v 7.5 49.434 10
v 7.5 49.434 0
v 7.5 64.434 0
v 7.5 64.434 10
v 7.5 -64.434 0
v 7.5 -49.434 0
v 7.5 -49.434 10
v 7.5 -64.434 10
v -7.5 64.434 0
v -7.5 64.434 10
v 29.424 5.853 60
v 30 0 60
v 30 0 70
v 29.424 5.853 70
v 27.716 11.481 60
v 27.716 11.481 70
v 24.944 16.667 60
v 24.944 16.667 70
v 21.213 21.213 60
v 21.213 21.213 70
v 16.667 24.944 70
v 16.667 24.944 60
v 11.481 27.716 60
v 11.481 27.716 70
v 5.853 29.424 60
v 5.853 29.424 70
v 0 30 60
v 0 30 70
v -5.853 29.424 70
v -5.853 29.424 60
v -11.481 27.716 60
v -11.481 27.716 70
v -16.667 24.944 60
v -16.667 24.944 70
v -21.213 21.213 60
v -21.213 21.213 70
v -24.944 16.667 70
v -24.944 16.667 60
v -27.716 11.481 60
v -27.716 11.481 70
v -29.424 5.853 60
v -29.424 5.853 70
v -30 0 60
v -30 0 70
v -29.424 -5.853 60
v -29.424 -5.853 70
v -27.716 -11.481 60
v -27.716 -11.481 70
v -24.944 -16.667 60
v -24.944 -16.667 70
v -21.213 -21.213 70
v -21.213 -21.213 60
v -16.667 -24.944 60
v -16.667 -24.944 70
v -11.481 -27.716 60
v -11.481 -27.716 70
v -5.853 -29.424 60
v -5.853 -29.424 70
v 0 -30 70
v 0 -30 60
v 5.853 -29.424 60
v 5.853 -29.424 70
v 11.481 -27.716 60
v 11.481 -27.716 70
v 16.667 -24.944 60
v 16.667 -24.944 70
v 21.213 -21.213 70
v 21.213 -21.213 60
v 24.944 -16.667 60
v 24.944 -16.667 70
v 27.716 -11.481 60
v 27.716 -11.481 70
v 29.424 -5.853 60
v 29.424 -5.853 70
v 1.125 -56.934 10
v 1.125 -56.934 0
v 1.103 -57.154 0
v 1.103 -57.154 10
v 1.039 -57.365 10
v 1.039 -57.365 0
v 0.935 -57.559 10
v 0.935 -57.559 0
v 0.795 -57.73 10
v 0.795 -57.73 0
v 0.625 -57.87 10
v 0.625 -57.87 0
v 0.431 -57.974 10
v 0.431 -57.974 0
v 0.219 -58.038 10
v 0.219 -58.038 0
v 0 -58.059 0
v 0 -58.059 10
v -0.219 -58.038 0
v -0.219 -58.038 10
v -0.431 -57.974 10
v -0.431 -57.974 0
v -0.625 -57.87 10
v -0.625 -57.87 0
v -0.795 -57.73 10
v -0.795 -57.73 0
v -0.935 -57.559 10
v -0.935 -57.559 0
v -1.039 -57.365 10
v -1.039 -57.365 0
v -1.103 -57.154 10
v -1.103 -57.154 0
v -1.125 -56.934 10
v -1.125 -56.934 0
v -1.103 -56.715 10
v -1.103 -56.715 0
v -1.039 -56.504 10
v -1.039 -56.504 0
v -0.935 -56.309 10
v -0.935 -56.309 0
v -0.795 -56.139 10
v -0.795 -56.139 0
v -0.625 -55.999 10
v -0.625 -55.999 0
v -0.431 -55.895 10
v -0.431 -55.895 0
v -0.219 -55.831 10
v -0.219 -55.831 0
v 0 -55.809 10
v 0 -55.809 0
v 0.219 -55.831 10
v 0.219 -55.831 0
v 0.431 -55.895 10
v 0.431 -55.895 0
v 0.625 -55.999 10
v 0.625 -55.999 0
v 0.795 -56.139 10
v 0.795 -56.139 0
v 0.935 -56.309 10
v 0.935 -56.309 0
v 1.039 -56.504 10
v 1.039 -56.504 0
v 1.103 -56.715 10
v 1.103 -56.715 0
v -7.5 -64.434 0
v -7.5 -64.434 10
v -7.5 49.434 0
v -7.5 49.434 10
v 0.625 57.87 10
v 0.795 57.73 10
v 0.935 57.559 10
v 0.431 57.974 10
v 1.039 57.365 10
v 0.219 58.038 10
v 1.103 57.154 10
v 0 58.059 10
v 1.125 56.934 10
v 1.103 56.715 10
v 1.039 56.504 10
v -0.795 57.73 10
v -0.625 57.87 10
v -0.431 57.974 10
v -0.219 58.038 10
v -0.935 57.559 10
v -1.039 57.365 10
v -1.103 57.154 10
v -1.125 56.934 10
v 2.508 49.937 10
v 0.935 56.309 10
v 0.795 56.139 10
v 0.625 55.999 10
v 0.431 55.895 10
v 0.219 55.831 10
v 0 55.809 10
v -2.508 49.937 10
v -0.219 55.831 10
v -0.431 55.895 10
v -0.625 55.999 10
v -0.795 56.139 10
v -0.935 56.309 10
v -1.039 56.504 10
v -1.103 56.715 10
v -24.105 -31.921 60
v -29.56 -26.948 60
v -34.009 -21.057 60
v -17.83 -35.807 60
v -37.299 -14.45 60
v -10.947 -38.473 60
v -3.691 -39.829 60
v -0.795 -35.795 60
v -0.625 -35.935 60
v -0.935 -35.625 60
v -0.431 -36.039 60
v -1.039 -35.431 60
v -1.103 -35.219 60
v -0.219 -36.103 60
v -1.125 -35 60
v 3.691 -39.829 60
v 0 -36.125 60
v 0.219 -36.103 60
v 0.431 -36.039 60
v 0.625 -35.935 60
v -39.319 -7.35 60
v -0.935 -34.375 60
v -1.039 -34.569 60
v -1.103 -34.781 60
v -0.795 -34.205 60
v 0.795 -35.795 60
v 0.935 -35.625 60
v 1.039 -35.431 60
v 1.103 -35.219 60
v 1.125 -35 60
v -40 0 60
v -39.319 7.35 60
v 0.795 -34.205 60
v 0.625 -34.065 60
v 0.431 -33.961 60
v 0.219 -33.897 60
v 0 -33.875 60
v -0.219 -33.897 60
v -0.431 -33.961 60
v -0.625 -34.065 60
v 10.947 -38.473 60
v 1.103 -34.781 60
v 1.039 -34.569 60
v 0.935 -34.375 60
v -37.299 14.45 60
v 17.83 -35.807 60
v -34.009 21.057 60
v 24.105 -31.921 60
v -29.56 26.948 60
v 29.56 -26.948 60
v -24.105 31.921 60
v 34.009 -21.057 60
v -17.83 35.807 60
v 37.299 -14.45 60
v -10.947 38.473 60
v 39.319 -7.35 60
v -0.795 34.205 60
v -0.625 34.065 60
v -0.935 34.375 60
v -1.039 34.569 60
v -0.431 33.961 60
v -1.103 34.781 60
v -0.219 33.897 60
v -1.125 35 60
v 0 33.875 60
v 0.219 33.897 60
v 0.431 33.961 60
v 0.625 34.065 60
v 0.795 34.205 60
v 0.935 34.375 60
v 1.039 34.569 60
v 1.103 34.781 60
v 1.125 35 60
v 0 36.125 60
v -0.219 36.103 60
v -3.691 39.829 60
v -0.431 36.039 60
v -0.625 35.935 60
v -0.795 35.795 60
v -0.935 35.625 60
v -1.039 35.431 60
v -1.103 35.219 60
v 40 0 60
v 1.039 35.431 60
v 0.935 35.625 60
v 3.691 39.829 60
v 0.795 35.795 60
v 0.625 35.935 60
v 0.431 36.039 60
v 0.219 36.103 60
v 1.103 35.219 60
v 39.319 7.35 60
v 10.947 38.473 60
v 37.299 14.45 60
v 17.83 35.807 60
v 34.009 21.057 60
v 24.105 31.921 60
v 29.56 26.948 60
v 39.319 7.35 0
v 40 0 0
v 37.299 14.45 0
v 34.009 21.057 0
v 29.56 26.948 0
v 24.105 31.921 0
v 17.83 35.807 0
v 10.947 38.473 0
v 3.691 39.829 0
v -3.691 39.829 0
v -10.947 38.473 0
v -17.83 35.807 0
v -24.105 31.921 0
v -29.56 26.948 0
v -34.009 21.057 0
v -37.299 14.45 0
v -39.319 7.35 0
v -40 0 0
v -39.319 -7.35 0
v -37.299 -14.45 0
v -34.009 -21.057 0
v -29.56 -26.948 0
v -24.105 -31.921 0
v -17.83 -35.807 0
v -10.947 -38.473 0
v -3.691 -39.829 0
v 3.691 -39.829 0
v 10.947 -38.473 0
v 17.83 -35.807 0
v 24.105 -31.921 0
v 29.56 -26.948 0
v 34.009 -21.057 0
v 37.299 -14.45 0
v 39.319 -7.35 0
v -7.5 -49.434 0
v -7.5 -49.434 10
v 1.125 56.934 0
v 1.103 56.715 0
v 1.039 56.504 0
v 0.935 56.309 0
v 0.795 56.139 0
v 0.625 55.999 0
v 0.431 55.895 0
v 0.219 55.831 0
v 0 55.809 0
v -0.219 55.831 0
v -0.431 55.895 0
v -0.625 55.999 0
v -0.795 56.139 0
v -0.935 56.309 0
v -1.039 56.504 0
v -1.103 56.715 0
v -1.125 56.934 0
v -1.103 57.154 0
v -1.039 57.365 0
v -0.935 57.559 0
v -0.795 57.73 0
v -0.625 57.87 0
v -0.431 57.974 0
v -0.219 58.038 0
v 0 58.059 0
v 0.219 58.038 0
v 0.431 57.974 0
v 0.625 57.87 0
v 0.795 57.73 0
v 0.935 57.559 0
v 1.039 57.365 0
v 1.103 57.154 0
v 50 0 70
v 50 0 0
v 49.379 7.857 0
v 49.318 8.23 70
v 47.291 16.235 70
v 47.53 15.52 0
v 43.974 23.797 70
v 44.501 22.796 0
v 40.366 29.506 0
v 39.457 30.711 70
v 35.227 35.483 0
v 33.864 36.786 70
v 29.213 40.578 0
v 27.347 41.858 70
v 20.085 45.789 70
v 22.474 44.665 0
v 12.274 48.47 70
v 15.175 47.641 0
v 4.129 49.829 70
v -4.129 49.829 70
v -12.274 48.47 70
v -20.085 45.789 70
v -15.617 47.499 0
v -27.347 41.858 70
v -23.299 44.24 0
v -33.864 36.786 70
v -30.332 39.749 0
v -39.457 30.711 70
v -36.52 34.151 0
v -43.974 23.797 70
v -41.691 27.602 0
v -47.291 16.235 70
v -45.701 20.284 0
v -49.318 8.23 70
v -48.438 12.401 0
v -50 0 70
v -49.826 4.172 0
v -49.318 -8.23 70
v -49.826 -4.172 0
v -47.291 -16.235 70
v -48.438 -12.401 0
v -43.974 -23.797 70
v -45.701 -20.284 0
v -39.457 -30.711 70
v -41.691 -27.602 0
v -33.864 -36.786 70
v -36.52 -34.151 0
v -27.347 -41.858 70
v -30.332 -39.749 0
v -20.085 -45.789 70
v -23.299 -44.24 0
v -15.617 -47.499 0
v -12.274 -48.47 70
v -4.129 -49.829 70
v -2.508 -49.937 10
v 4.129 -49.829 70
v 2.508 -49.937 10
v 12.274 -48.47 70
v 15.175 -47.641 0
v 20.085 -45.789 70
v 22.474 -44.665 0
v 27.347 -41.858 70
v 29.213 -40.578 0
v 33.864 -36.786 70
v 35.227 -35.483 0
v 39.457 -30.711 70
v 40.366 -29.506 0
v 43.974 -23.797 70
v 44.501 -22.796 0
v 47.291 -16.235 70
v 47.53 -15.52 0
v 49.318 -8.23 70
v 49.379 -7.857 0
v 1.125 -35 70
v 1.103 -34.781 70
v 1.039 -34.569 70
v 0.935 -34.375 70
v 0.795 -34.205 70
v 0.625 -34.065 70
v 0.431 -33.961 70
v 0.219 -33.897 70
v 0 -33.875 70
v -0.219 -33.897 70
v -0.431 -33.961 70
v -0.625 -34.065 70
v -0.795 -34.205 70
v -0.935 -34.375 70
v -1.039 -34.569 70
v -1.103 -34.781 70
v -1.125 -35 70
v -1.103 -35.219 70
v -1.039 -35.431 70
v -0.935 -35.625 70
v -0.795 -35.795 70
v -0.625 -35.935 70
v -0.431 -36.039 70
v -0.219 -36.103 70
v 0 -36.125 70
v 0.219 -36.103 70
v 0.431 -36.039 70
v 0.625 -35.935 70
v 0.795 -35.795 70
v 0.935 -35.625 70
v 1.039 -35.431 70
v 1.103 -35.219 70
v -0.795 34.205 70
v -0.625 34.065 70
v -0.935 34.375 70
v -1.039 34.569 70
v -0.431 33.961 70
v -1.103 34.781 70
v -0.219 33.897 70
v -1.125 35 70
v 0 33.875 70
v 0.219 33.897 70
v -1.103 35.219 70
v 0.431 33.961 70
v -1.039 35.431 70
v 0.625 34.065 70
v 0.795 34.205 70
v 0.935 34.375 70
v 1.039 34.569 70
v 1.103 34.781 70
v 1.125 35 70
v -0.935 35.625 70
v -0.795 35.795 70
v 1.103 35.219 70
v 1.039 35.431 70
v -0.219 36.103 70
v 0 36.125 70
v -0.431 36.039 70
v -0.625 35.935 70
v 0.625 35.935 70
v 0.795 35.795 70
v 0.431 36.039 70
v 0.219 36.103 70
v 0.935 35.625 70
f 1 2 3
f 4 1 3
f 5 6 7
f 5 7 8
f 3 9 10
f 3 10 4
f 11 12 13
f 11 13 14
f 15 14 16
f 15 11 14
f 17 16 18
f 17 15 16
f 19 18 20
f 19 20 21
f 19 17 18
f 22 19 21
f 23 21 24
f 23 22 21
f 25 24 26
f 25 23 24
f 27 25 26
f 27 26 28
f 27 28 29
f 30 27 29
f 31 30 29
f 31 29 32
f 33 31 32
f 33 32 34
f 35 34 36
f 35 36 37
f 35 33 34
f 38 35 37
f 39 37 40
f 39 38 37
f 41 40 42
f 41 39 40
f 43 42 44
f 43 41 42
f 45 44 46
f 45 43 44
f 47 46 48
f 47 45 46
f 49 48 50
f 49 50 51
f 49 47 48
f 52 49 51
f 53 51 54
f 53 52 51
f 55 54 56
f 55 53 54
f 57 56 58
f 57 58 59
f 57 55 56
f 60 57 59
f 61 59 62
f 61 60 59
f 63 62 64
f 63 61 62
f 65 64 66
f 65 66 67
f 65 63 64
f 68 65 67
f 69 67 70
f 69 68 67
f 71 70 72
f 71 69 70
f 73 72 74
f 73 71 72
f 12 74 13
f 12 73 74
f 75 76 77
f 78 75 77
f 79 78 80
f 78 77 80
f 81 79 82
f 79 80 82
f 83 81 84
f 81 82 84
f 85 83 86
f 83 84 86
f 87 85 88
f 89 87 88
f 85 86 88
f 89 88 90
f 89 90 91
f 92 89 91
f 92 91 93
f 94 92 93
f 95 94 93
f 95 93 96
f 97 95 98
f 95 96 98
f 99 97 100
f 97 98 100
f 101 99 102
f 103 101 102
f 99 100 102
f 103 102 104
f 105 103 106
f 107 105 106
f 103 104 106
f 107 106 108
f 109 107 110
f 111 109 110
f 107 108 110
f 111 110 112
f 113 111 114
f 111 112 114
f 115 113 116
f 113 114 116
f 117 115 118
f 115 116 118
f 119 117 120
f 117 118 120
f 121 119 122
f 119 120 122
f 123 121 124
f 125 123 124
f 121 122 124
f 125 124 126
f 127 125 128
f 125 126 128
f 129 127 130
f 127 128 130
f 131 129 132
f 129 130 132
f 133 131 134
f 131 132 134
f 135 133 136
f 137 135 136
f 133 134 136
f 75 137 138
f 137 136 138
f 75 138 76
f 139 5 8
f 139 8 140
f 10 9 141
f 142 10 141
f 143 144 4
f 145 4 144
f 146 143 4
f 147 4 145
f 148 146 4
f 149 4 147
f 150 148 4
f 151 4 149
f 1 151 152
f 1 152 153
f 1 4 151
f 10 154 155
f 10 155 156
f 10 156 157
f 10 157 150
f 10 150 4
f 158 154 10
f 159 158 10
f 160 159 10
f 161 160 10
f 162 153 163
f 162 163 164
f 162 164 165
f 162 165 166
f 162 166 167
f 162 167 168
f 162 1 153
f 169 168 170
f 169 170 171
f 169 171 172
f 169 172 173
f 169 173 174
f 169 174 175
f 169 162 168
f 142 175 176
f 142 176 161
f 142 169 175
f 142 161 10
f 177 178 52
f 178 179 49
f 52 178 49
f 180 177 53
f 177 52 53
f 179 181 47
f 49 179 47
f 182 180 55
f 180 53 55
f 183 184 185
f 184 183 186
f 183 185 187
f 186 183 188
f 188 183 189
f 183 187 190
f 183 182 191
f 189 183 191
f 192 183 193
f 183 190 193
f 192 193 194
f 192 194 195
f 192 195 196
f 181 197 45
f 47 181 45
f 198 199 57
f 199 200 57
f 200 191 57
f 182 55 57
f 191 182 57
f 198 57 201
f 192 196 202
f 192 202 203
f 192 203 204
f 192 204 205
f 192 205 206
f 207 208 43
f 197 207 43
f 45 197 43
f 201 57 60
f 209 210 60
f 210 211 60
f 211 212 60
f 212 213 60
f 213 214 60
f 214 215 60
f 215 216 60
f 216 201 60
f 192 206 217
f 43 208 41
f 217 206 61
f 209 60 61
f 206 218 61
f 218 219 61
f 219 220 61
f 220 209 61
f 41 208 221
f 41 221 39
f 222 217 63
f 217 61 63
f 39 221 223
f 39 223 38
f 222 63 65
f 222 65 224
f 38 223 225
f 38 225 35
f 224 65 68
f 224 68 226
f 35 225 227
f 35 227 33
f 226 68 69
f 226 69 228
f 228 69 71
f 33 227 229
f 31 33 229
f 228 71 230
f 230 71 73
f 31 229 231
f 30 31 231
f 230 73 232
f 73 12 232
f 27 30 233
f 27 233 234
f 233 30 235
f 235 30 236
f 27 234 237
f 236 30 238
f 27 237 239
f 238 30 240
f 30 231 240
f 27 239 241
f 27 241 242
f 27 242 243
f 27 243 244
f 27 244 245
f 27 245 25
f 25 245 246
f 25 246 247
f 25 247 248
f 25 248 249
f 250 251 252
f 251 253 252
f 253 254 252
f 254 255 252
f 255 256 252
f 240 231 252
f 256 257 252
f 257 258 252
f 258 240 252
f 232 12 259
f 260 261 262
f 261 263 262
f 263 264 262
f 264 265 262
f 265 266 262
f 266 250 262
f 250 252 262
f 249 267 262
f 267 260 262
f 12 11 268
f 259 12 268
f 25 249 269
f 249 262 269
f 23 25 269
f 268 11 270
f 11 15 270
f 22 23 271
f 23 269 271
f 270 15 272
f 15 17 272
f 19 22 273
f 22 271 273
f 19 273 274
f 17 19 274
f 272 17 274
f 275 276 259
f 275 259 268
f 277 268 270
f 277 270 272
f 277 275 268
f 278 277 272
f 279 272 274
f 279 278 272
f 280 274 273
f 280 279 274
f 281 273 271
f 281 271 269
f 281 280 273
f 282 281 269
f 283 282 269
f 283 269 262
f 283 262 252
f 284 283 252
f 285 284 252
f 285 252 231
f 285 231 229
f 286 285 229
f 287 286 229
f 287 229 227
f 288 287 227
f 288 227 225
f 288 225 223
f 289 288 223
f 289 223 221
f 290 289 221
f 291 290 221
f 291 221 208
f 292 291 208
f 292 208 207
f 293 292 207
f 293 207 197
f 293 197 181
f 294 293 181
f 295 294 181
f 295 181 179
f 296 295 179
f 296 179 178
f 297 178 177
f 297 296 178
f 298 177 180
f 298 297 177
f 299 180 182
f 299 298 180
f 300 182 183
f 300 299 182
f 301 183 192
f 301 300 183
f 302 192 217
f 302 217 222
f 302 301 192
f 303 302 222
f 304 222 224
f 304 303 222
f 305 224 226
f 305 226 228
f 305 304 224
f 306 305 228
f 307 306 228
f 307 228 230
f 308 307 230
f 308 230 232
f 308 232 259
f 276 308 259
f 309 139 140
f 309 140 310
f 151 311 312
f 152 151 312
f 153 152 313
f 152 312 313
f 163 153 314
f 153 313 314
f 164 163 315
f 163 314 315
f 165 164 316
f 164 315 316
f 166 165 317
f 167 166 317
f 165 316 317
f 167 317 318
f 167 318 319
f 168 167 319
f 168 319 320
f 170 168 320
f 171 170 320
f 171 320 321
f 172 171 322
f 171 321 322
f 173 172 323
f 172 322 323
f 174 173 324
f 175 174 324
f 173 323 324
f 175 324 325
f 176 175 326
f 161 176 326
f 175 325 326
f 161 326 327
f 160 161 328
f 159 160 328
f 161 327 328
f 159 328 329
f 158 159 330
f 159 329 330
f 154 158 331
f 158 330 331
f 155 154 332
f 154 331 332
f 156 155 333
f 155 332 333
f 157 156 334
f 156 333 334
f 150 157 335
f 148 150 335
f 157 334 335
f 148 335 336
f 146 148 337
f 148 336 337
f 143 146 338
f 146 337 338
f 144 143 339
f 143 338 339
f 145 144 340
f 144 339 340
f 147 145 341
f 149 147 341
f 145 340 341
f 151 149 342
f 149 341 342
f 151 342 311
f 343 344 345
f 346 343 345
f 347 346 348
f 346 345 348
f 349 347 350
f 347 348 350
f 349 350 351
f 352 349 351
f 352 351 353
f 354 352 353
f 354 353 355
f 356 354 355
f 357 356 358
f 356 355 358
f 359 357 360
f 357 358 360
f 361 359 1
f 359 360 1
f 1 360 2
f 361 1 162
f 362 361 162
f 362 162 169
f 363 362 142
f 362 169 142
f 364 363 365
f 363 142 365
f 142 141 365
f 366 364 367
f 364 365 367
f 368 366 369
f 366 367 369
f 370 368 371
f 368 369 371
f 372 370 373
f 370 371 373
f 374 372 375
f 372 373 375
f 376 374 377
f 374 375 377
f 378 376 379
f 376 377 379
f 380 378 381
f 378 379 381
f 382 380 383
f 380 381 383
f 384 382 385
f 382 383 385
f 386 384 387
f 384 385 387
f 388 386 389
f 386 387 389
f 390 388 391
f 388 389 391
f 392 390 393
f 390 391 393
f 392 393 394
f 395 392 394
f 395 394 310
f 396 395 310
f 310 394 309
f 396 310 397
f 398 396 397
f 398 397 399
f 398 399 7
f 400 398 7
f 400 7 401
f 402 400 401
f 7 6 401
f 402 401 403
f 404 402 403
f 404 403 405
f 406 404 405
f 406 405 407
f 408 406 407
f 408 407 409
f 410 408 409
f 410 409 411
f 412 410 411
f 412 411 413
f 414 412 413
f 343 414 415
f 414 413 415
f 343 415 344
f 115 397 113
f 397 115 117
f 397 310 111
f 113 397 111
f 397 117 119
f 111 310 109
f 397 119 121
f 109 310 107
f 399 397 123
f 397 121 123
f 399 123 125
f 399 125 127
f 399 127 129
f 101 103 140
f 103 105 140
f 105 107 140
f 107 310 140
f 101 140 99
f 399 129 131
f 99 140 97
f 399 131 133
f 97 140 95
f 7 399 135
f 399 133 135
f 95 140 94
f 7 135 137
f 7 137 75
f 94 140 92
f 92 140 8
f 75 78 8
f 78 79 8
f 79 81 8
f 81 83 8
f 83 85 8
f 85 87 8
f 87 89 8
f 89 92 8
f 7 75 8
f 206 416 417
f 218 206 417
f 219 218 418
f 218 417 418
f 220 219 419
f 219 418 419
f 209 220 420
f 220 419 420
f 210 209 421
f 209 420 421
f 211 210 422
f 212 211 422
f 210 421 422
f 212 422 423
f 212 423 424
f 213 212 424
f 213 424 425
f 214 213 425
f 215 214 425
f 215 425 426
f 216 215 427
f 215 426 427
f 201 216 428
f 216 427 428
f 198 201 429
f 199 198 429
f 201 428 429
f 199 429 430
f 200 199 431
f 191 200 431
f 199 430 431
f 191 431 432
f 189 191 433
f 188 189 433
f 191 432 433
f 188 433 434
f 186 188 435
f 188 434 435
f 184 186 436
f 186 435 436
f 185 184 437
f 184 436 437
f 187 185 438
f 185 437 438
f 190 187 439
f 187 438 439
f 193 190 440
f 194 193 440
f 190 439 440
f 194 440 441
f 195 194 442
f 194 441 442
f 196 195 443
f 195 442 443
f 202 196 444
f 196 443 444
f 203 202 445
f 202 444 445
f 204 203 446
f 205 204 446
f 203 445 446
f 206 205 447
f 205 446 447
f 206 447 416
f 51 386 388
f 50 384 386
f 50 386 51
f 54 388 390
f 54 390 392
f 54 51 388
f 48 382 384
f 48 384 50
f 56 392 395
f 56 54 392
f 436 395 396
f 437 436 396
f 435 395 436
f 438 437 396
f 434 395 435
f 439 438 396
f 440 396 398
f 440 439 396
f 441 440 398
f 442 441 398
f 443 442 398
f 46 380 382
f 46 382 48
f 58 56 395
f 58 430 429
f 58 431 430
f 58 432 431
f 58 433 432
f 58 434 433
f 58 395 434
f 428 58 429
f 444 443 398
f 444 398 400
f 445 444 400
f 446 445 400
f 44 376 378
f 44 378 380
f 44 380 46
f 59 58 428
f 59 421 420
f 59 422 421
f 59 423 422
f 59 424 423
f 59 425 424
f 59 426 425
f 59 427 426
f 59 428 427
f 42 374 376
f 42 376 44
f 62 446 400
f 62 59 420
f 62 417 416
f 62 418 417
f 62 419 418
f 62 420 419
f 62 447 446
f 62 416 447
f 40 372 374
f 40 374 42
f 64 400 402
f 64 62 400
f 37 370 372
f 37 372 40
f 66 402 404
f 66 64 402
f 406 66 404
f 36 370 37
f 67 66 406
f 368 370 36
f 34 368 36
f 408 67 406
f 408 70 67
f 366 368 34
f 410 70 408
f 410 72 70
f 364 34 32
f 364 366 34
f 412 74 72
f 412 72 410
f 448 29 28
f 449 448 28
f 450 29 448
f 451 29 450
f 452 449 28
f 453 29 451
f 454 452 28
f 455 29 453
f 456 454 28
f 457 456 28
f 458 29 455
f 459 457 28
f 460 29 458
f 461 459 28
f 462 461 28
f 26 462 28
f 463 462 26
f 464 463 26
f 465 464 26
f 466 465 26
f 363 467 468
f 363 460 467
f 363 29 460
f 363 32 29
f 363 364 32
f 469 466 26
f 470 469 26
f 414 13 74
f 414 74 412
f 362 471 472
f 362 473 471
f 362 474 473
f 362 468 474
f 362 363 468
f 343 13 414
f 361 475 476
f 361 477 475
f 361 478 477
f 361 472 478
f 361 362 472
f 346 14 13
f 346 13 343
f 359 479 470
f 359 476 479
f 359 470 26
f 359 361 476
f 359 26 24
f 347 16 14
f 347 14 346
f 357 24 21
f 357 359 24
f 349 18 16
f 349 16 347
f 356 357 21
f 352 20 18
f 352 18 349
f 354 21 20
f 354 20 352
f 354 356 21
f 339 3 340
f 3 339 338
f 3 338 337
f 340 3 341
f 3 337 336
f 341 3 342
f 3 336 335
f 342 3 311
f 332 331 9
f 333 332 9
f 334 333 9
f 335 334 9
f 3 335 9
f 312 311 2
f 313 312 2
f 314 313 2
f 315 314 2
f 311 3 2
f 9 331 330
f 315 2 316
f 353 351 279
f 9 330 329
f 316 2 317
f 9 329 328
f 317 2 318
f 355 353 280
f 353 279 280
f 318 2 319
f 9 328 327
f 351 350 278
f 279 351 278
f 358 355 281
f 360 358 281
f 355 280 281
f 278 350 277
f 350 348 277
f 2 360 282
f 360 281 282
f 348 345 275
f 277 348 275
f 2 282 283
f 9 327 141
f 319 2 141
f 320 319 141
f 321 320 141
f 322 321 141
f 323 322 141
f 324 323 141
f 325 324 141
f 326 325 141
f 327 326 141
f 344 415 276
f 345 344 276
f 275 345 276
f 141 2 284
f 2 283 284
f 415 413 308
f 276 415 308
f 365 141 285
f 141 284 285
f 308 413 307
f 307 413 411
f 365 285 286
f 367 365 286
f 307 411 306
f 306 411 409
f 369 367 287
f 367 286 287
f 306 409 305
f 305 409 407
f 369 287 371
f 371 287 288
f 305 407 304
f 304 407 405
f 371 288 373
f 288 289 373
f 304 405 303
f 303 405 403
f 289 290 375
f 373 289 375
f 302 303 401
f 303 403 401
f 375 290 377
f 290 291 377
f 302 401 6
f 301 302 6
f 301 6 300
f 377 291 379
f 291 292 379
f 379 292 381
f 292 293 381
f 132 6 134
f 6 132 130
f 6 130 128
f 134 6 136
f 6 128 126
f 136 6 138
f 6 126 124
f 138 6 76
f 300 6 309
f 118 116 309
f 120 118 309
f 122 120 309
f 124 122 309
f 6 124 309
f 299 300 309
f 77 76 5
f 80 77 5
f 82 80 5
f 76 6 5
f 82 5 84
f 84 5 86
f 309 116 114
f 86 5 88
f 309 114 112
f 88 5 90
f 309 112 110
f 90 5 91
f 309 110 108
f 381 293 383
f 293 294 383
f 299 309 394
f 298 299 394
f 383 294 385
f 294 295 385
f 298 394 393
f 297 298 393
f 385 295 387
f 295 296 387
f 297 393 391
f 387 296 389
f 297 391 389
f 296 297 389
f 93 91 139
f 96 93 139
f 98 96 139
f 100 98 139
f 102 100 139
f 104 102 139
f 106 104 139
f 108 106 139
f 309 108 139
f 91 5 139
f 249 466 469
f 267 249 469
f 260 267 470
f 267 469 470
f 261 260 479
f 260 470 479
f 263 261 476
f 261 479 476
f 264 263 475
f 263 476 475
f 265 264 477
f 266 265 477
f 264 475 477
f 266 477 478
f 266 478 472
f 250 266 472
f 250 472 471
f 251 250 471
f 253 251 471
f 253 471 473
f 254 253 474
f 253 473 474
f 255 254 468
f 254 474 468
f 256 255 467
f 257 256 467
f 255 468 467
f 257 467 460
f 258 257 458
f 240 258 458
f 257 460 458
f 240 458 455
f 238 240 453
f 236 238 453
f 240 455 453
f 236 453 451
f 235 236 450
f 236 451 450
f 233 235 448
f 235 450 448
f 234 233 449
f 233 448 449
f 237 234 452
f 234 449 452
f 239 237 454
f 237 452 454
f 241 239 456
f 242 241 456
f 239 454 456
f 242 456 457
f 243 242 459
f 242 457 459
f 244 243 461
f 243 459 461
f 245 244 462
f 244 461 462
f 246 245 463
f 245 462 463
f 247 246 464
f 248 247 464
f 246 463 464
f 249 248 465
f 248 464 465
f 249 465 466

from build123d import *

# Parameters (mm, degrees)
SKETCH001_R      = 1.125
EXTRUDE001_DEPTH = 10
SKETCH_R         = 1.125
EXTRUDE_DEPTH    = 10
TUBE001_R        = 40
TUBE001_R_2      = 30
TUBE001_DEPTH    = 10
TUBE_R           = 50
TUBE_R_2         = 40
TUBE_DEPTH       = 70


with BuildPart() as extrude001:
    # Sketch001 (on Face21 of Fusion001) → Extrude001 (new body)
    with BuildSketch(Plane.XY.offset(70)):
        with Locations((0, 35)):
            Circle(SKETCH001_R)
        with Locations((0, -35)):
            Circle(SKETCH001_R)
    extrude(amount=-EXTRUDE001_DEPTH)


with BuildPart() as extrude_body:
    # Sketch (on Face3 of Tube) → Extrude (new body)
    with BuildSketch(Plane(origin=(0, 0, 0), x_dir=(1, 0, 0), z_dir=(0, 0, -1))):
        Polygon((7.5, 49.4343), (7.5, 64.4343), (0, 64.4343), (-7.5, 64.4343), (-7.5, 49.4343), (0, 49.4343), align=None)
        with Locations((0, 56.9343)):
            Circle(SKETCH_R, mode=Mode.SUBTRACT)
        Polygon((7.5, -49.4343), (7.5, -64.4343), (0, -64.4343), (-7.5, -64.4343), (-7.5, -49.4343), (0, -49.4343), align=None)
        with Locations((0, -56.9343)):
            Circle(SKETCH_R, mode=Mode.SUBTRACT)
    extrude(amount=-EXTRUDE_DEPTH)


with BuildPart() as tube001:
    # Tube001 → Tube001 (new body)
    with BuildSketch(Plane.XY.offset(60)):
        Circle(TUBE001_R)
        Circle(TUBE001_R_2, mode=Mode.SUBTRACT)
    extrude(amount=TUBE001_DEPTH)


with BuildPart() as bigredbuttonmount001:
    # Tube → Tube (new body)
    with BuildSketch(Plane.XY):
        Circle(TUBE_R)
        Circle(TUBE_R_2, mode=Mode.SUBTRACT)
    extrude(amount=TUBE_DEPTH)

    # Fusion: union Tube001
    add(tube001.part)

    # Fusion001: union Extrude body
    add(extrude_body.part)

    # Cut: cut Extrude001
    add(extrude001.part, mode=Mode.SUBTRACT)


solid = bigredbuttonmount001.part
